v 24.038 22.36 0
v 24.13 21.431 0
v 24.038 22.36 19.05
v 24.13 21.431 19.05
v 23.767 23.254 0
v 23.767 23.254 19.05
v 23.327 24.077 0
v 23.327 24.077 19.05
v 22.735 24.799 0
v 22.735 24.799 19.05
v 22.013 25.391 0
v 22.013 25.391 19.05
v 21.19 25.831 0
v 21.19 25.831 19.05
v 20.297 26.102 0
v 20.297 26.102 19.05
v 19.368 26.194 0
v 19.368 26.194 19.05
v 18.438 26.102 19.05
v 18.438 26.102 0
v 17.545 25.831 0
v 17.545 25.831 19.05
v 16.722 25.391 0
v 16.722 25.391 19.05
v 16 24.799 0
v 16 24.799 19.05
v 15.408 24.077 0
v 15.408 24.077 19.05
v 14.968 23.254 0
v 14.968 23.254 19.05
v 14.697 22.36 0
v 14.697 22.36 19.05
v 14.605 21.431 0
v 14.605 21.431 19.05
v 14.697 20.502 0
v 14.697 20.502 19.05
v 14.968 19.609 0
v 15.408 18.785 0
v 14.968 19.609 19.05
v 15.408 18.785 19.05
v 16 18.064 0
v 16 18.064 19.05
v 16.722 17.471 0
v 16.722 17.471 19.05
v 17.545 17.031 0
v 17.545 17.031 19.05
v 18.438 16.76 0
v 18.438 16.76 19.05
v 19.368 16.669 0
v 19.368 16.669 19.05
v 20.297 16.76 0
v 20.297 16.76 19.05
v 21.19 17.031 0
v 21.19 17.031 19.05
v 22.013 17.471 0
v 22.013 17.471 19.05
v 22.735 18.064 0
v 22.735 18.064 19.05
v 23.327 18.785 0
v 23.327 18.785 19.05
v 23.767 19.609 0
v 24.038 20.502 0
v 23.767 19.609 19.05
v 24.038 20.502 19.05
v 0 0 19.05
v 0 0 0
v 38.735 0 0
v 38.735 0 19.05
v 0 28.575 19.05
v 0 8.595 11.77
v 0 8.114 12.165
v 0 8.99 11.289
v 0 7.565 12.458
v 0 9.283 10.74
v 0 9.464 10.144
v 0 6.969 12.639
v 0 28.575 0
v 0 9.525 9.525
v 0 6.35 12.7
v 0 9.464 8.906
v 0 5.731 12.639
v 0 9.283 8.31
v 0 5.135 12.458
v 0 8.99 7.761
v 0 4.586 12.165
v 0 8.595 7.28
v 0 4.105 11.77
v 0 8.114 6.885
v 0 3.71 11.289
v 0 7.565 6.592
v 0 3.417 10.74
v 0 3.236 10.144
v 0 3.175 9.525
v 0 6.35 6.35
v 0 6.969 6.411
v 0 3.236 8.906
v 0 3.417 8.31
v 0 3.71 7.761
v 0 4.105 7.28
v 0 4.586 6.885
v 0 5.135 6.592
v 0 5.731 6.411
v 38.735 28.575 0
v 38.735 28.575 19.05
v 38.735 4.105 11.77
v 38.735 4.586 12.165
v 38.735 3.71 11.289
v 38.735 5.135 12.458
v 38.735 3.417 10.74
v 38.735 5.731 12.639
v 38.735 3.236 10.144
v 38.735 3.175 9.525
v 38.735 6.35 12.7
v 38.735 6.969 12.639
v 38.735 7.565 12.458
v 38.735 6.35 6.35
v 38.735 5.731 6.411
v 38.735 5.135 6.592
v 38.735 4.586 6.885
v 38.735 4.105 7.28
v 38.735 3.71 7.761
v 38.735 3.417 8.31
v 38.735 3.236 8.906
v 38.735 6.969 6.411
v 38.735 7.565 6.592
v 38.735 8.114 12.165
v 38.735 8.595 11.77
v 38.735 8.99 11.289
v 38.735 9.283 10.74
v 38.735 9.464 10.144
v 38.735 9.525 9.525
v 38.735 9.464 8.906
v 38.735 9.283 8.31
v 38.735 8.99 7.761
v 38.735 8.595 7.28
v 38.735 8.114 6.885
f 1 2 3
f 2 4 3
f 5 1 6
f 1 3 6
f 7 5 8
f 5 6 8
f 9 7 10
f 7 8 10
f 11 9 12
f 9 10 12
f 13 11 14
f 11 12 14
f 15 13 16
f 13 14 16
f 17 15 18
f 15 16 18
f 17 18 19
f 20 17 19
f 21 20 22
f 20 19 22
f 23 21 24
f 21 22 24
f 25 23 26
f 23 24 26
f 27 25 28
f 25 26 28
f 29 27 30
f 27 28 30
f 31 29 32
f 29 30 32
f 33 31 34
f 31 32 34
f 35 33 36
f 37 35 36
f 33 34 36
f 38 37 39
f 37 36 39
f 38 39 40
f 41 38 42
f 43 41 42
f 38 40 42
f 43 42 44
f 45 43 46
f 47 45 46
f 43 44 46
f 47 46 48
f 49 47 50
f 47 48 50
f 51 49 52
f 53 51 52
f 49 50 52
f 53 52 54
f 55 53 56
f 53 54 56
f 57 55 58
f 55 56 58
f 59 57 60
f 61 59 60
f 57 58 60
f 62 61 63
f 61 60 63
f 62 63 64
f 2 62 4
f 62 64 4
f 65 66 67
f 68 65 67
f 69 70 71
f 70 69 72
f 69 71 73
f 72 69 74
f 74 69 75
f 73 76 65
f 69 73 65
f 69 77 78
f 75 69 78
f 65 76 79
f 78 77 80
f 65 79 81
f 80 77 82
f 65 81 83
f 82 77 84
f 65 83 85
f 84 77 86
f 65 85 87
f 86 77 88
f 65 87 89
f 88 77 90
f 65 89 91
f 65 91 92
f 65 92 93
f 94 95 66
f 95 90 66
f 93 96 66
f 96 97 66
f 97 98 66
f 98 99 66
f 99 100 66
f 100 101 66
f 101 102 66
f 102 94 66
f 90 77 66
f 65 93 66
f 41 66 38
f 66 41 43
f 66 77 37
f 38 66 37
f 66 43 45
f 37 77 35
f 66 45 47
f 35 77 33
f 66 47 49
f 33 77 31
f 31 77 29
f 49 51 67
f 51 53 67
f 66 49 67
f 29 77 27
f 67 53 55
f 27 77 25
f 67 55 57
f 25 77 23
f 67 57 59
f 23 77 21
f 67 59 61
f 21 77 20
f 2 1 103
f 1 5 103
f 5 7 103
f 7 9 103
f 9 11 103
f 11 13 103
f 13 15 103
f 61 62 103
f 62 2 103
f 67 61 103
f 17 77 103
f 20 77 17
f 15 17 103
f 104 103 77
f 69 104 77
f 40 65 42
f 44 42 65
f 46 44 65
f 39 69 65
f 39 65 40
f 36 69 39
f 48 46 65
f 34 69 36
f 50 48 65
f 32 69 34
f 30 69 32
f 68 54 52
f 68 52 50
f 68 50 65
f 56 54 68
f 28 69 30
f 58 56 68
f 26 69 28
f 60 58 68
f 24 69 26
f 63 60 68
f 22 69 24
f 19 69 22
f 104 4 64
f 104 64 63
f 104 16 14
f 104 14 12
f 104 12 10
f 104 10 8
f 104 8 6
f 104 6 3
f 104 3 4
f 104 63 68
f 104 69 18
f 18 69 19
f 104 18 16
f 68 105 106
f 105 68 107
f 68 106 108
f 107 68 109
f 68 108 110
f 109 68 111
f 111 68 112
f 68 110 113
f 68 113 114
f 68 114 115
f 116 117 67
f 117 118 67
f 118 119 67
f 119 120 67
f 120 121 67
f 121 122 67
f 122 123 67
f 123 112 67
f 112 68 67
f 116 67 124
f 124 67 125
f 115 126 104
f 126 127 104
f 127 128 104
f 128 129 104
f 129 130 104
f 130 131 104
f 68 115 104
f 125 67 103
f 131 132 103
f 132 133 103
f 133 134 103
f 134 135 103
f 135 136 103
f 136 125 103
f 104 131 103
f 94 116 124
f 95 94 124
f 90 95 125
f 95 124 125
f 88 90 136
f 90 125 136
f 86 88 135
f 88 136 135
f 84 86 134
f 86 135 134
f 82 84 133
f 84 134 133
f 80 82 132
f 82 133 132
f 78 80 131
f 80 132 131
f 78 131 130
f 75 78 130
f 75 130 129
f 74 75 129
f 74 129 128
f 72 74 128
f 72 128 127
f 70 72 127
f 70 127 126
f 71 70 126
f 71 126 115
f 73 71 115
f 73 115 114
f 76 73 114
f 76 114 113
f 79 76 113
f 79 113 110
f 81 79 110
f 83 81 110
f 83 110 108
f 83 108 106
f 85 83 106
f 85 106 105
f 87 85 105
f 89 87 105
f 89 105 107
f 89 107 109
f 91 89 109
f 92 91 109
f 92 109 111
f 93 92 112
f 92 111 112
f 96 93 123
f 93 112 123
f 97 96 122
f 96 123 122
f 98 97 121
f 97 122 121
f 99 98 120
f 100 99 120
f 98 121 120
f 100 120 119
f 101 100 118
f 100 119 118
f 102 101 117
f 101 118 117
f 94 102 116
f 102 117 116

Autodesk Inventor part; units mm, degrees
ref_plane "YZ Plane" through (0, 0, 0) normal (1, 0, 0) x (0, 1, 0)
ref_plane "XZ Plane" through (0, 0, 0) normal (0, 1, 0) x (-1, 0, 0)
ref_plane "XY Plane" through (0, 0, 0) normal (0, 0, 1) x (1, 0, 0)
sketch "Sketch1" plane through (0, 0, 0) normal (0, 0, 1) x (1, 0, 0)
  line L0 (0, 0) -> (38.735, 0)
  line L1 (38.735, 0) -> (38.735, 28.575)
  line L2 (38.735, 28.575) -> (0, 28.575)
  line L3 (0, 28.575) -> (0, 0)
  dimension "d0" = 38.735
  dimension "d1" = 28.575
extrude "Extrusion1" add sketch "Sketch1" along normal blind 19.05
sketch "Sketch2" plane through (38.735, 0, 0) normal (1, 0, 0) x (0, 0, -1)
  line L0 (0, 0) -> (-19.05, 0)
  line L1 (0, 0) -> (-19.05, 0) projected
  line L2 (-19.05, 0) -> (-9.525, 0)
  line L3 (-9.525, 0) -> (-9.525, 28.575)
  line L4 (0, 28.575) -> (-19.05, 28.575) projected
  line L5 (-9.525, 0) -> (-9.525, 12.7)
  line L6 (-9.525, 12.7) -> (-9.525, 6.35)
  circle A0 centre (-9.525, 6.35) radius 3.175
  dimension "d4" = 12.7
  dimension "d5" = 6.35
  dimension "d6" = 6.35
extrude "Extrusion2" cut sketch "Sketch2" against normal blind 76.2
sketch "Sketch3" plane through (0, 0, 19.05) normal (0, 0, 1) x (1, 0, 0)
  line L0 (0, 0) -> (0, 28.575)
  line L1 (0, 28.575) -> (0, 0) projected
  line L2 (0, 28.575) -> (38.735, 28.575)
  line L3 (38.735, 28.575) -> (19.3675, 28.575)
  line L4 (19.3675, 28.575) -> (19.3675, 0)
  line L5 (19.3675, 0) -> (19.3675, 14.2875)
  line L6 (19.3675, 14.2875) -> (19.3675, 28.575)
  line L7 (19.3675, 28.575) -> (19.3675, 21.4312)
  circle A0 centre (19.3675, 21.4312) radius 4.7625
  dimension "d9" = 9.525
extrude "Extrusion3" cut sketch "Sketch3" against normal blind 76.2
thread "Thread1" size "3/8-16 UNC" class "2B" standard "ANSI Unified Screw Threads" full length
properties part number "coupler"
